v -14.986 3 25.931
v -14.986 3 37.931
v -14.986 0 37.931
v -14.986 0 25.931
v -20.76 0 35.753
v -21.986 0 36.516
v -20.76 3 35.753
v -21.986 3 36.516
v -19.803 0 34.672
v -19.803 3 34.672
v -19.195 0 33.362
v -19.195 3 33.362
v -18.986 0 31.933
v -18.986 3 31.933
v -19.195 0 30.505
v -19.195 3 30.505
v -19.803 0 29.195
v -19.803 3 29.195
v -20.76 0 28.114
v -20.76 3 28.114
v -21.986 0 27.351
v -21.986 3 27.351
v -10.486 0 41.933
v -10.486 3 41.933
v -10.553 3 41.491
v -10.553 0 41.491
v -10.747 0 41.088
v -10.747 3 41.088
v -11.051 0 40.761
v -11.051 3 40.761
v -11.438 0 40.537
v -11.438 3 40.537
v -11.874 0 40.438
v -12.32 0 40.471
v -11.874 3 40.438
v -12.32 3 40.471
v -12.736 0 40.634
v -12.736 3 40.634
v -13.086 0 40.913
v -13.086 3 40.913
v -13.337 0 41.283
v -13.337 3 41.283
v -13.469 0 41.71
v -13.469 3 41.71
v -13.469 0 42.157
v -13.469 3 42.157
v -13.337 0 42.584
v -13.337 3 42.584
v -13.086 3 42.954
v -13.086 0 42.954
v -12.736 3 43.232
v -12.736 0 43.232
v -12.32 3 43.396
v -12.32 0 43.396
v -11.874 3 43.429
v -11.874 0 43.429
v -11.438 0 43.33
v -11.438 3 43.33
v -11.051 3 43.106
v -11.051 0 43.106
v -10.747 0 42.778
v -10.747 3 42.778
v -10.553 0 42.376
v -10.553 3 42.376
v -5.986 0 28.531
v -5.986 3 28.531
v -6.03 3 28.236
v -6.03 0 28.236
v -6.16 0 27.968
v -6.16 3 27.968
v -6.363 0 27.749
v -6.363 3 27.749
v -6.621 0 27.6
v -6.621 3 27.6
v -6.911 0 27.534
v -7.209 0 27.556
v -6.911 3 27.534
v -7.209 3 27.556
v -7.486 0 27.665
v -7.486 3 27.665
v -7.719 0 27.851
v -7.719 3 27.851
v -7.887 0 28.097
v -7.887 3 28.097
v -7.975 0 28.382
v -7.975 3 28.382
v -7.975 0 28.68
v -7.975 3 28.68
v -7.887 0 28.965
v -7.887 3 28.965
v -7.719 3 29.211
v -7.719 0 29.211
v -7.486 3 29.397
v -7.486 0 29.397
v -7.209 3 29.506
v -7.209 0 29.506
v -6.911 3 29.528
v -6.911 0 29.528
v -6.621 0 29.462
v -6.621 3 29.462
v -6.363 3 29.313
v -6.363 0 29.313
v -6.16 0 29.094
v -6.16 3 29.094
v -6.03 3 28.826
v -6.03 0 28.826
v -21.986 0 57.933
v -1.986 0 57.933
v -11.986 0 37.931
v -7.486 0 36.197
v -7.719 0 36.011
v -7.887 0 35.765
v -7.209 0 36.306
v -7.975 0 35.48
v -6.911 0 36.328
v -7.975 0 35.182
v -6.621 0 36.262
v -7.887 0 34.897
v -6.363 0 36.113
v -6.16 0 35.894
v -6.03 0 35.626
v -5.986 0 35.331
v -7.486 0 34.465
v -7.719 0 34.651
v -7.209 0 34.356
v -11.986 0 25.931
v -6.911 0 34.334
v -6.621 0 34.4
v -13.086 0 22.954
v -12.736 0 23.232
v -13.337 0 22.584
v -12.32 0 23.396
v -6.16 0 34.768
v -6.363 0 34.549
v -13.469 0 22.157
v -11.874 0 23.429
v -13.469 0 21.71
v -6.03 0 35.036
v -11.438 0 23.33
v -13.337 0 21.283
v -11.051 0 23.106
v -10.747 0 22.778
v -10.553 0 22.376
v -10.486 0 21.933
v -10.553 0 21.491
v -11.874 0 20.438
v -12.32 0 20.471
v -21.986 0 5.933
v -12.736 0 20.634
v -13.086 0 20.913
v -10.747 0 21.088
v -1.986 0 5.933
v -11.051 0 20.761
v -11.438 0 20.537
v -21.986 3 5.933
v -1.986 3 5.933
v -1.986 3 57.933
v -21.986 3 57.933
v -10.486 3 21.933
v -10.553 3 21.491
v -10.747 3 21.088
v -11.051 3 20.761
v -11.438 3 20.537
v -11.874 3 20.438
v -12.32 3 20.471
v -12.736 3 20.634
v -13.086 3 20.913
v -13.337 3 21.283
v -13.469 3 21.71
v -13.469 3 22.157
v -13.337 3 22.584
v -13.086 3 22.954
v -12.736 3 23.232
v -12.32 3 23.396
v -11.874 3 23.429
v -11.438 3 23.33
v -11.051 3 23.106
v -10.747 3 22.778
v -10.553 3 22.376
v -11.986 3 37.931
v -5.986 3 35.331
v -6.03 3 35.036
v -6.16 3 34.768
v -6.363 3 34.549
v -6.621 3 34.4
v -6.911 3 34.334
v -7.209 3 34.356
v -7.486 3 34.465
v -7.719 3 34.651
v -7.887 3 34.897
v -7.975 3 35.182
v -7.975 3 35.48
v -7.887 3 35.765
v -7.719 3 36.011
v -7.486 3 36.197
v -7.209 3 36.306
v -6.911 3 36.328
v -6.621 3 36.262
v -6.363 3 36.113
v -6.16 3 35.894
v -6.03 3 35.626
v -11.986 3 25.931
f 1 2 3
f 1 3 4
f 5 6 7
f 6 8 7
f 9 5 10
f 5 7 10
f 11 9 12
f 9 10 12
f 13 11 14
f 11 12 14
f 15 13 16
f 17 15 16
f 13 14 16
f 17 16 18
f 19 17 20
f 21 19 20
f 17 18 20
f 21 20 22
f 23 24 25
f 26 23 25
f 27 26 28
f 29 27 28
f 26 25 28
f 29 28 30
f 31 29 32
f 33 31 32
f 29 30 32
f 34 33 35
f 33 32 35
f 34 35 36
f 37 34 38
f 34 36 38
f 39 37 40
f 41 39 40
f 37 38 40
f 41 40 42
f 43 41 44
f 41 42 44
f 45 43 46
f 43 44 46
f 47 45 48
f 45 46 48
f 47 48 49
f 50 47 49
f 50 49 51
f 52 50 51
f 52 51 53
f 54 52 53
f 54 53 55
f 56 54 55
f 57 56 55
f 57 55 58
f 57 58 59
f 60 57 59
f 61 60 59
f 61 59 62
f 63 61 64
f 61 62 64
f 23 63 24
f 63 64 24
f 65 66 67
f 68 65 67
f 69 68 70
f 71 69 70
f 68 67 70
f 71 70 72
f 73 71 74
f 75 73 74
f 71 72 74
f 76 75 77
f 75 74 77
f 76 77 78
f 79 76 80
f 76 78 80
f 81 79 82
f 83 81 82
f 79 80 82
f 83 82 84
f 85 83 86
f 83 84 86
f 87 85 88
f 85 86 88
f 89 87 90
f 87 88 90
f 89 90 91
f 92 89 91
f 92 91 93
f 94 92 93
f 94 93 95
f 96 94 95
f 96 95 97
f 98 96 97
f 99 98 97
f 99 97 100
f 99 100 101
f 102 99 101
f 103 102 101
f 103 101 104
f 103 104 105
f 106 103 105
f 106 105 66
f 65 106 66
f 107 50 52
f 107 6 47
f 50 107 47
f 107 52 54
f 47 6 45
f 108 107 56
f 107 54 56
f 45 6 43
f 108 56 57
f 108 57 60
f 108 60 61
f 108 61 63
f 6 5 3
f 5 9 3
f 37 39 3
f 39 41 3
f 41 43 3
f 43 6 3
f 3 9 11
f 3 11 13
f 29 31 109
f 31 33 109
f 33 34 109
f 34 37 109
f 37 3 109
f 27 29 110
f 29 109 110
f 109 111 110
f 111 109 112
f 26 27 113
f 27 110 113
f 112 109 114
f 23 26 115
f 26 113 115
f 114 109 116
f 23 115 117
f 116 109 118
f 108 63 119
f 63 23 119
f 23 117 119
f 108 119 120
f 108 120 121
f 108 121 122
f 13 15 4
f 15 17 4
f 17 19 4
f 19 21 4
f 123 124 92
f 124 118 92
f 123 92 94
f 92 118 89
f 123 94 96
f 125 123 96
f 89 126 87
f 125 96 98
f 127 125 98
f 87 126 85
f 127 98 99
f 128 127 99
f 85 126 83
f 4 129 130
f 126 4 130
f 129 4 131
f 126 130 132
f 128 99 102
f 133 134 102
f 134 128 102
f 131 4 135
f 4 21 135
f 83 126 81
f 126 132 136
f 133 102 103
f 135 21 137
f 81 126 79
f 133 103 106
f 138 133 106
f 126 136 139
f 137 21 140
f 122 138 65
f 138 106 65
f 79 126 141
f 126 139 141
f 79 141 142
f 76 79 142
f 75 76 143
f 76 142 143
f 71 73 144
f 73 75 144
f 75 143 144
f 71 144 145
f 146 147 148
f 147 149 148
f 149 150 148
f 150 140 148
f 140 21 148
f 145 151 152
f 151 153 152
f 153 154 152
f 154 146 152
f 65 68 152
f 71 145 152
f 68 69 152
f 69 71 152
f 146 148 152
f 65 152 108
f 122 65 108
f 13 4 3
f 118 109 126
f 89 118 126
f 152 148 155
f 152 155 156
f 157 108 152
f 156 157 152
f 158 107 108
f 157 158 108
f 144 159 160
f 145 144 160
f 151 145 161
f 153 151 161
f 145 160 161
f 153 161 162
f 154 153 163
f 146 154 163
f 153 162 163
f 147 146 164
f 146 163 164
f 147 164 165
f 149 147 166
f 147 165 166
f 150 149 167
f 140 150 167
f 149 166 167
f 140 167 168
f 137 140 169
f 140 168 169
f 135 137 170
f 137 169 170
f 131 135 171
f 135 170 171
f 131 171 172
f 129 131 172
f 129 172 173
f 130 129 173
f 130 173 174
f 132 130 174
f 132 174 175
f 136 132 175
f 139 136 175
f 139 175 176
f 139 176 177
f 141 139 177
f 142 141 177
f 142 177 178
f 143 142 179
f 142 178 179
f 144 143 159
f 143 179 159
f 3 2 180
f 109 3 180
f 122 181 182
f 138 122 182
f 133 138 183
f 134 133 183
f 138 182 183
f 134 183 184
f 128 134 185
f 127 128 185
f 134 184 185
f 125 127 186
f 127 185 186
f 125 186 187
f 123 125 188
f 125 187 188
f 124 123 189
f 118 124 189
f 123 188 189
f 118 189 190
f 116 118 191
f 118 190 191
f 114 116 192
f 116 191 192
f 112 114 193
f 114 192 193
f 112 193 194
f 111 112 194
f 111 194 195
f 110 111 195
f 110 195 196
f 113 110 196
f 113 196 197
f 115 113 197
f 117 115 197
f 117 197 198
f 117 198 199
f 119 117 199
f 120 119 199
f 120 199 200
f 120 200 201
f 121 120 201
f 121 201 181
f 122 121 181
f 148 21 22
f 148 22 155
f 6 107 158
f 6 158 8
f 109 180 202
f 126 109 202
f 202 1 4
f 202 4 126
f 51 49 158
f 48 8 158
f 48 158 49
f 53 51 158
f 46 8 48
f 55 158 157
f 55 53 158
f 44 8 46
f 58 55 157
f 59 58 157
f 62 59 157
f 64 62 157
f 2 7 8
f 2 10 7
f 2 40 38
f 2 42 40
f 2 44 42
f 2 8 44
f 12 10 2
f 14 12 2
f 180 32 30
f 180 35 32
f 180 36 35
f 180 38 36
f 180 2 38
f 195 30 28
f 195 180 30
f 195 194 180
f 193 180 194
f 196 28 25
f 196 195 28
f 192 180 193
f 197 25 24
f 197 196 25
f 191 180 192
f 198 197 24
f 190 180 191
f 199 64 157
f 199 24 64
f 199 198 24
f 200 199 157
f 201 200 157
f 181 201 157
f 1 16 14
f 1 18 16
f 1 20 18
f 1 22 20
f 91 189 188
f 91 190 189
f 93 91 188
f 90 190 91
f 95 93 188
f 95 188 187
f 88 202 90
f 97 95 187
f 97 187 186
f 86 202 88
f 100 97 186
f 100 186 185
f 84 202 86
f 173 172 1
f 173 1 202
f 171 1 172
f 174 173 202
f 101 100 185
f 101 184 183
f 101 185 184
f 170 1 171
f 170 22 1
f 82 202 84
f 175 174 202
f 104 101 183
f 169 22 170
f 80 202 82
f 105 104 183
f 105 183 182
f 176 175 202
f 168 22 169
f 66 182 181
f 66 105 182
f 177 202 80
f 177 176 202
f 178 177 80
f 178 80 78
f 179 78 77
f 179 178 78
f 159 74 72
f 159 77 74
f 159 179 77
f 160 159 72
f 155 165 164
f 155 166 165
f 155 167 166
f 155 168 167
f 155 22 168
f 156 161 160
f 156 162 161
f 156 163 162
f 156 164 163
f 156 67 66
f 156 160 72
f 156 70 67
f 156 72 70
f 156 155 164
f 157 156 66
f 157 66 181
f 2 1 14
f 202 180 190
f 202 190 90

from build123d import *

# Parameters (mm, degrees)
ESQUISSE1_W             = 20
ESQUISSE1_H             = 52
BOSS_EXTRU_1_DEPTH      = 3
ESQUISSE2_R             = 1.5
ENL_V_MAT_EXTRU_1_DEPTH = 3
ESQUISSE3_R             = 5
ENL_V_MAT_EXTRU_2_DEPTH = 3
ESQUISSE4_W             = 3
ESQUISSE4_H             = 12
ENL_V_MAT_EXTRU_3_DEPTH = 10
ESQUISSE5_R             = 1
ENL_V_MAT_EXTRU_5_DEPTH = 10


with BuildPart() as part:
    # Esquisse1 → Boss.-Extru.1 (new body)
    with BuildSketch(Plane(origin=(0, 0, 0), x_dir=(1, 0, 0), z_dir=(0, 1, 0))):
        with Locations((-11.986036915, -31.933409069)):
            Rectangle(ESQUISSE1_W, ESQUISSE1_H)
    extrude(amount=BOSS_EXTRU_1_DEPTH)

    # Esquisse2 → Enlèv. mat.-Extru.1 (cut)
    with BuildSketch(Plane(origin=(0, 3, 0), x_dir=(1, 0, 0), z_dir=(0, 1, 0))):
        with Locations((-11.986036915, -41.933409069)):
            Circle(ESQUISSE2_R)
        with Locations((-11.986036915, -21.933409069)):
            Circle(ESQUISSE2_R)
    extrude(amount=-ENL_V_MAT_EXTRU_1_DEPTH, mode=Mode.SUBTRACT)

    # Esquisse3 → Enlèv. mat.-Extru.2 (cut)
    with BuildSketch(Plane(origin=(0, 3, 0), x_dir=(1, 0, 0), z_dir=(0, 1, 0))):
        with Locations((-23.986036915, -31.933409069)):
            Circle(ESQUISSE3_R)
    extrude(amount=-ENL_V_MAT_EXTRU_2_DEPTH, mode=Mode.SUBTRACT)

    # Esquisse4 → Enlèv. mat.-Extru.3 (cut)
    with BuildSketch(Plane(origin=(0, 3, 0), x_dir=(1, 0, 0), z_dir=(0, 1, 0))):
        with Locations((-13.486036915, -31.930984764)):
            Rectangle(ESQUISSE4_W, ESQUISSE4_H)
    extrude(amount=-ENL_V_MAT_EXTRU_3_DEPTH, mode=Mode.SUBTRACT)

    # Esquisse5 → Enlèv. mat.-Extru.5 (cut)
    with BuildSketch(Plane(origin=(0, 3, 0), x_dir=(1, 0, 0), z_dir=(0, 1, 0))):
        with Locations((-6.986036915, -35.330984764)):
            Circle(ESQUISSE5_R)
        with Locations((-6.986036915, -28.530984764)):
            Circle(ESQUISSE5_R)
    extrude(amount=-ENL_V_MAT_EXTRU_5_DEPTH, mode=Mode.SUBTRACT)


solid = part.part
